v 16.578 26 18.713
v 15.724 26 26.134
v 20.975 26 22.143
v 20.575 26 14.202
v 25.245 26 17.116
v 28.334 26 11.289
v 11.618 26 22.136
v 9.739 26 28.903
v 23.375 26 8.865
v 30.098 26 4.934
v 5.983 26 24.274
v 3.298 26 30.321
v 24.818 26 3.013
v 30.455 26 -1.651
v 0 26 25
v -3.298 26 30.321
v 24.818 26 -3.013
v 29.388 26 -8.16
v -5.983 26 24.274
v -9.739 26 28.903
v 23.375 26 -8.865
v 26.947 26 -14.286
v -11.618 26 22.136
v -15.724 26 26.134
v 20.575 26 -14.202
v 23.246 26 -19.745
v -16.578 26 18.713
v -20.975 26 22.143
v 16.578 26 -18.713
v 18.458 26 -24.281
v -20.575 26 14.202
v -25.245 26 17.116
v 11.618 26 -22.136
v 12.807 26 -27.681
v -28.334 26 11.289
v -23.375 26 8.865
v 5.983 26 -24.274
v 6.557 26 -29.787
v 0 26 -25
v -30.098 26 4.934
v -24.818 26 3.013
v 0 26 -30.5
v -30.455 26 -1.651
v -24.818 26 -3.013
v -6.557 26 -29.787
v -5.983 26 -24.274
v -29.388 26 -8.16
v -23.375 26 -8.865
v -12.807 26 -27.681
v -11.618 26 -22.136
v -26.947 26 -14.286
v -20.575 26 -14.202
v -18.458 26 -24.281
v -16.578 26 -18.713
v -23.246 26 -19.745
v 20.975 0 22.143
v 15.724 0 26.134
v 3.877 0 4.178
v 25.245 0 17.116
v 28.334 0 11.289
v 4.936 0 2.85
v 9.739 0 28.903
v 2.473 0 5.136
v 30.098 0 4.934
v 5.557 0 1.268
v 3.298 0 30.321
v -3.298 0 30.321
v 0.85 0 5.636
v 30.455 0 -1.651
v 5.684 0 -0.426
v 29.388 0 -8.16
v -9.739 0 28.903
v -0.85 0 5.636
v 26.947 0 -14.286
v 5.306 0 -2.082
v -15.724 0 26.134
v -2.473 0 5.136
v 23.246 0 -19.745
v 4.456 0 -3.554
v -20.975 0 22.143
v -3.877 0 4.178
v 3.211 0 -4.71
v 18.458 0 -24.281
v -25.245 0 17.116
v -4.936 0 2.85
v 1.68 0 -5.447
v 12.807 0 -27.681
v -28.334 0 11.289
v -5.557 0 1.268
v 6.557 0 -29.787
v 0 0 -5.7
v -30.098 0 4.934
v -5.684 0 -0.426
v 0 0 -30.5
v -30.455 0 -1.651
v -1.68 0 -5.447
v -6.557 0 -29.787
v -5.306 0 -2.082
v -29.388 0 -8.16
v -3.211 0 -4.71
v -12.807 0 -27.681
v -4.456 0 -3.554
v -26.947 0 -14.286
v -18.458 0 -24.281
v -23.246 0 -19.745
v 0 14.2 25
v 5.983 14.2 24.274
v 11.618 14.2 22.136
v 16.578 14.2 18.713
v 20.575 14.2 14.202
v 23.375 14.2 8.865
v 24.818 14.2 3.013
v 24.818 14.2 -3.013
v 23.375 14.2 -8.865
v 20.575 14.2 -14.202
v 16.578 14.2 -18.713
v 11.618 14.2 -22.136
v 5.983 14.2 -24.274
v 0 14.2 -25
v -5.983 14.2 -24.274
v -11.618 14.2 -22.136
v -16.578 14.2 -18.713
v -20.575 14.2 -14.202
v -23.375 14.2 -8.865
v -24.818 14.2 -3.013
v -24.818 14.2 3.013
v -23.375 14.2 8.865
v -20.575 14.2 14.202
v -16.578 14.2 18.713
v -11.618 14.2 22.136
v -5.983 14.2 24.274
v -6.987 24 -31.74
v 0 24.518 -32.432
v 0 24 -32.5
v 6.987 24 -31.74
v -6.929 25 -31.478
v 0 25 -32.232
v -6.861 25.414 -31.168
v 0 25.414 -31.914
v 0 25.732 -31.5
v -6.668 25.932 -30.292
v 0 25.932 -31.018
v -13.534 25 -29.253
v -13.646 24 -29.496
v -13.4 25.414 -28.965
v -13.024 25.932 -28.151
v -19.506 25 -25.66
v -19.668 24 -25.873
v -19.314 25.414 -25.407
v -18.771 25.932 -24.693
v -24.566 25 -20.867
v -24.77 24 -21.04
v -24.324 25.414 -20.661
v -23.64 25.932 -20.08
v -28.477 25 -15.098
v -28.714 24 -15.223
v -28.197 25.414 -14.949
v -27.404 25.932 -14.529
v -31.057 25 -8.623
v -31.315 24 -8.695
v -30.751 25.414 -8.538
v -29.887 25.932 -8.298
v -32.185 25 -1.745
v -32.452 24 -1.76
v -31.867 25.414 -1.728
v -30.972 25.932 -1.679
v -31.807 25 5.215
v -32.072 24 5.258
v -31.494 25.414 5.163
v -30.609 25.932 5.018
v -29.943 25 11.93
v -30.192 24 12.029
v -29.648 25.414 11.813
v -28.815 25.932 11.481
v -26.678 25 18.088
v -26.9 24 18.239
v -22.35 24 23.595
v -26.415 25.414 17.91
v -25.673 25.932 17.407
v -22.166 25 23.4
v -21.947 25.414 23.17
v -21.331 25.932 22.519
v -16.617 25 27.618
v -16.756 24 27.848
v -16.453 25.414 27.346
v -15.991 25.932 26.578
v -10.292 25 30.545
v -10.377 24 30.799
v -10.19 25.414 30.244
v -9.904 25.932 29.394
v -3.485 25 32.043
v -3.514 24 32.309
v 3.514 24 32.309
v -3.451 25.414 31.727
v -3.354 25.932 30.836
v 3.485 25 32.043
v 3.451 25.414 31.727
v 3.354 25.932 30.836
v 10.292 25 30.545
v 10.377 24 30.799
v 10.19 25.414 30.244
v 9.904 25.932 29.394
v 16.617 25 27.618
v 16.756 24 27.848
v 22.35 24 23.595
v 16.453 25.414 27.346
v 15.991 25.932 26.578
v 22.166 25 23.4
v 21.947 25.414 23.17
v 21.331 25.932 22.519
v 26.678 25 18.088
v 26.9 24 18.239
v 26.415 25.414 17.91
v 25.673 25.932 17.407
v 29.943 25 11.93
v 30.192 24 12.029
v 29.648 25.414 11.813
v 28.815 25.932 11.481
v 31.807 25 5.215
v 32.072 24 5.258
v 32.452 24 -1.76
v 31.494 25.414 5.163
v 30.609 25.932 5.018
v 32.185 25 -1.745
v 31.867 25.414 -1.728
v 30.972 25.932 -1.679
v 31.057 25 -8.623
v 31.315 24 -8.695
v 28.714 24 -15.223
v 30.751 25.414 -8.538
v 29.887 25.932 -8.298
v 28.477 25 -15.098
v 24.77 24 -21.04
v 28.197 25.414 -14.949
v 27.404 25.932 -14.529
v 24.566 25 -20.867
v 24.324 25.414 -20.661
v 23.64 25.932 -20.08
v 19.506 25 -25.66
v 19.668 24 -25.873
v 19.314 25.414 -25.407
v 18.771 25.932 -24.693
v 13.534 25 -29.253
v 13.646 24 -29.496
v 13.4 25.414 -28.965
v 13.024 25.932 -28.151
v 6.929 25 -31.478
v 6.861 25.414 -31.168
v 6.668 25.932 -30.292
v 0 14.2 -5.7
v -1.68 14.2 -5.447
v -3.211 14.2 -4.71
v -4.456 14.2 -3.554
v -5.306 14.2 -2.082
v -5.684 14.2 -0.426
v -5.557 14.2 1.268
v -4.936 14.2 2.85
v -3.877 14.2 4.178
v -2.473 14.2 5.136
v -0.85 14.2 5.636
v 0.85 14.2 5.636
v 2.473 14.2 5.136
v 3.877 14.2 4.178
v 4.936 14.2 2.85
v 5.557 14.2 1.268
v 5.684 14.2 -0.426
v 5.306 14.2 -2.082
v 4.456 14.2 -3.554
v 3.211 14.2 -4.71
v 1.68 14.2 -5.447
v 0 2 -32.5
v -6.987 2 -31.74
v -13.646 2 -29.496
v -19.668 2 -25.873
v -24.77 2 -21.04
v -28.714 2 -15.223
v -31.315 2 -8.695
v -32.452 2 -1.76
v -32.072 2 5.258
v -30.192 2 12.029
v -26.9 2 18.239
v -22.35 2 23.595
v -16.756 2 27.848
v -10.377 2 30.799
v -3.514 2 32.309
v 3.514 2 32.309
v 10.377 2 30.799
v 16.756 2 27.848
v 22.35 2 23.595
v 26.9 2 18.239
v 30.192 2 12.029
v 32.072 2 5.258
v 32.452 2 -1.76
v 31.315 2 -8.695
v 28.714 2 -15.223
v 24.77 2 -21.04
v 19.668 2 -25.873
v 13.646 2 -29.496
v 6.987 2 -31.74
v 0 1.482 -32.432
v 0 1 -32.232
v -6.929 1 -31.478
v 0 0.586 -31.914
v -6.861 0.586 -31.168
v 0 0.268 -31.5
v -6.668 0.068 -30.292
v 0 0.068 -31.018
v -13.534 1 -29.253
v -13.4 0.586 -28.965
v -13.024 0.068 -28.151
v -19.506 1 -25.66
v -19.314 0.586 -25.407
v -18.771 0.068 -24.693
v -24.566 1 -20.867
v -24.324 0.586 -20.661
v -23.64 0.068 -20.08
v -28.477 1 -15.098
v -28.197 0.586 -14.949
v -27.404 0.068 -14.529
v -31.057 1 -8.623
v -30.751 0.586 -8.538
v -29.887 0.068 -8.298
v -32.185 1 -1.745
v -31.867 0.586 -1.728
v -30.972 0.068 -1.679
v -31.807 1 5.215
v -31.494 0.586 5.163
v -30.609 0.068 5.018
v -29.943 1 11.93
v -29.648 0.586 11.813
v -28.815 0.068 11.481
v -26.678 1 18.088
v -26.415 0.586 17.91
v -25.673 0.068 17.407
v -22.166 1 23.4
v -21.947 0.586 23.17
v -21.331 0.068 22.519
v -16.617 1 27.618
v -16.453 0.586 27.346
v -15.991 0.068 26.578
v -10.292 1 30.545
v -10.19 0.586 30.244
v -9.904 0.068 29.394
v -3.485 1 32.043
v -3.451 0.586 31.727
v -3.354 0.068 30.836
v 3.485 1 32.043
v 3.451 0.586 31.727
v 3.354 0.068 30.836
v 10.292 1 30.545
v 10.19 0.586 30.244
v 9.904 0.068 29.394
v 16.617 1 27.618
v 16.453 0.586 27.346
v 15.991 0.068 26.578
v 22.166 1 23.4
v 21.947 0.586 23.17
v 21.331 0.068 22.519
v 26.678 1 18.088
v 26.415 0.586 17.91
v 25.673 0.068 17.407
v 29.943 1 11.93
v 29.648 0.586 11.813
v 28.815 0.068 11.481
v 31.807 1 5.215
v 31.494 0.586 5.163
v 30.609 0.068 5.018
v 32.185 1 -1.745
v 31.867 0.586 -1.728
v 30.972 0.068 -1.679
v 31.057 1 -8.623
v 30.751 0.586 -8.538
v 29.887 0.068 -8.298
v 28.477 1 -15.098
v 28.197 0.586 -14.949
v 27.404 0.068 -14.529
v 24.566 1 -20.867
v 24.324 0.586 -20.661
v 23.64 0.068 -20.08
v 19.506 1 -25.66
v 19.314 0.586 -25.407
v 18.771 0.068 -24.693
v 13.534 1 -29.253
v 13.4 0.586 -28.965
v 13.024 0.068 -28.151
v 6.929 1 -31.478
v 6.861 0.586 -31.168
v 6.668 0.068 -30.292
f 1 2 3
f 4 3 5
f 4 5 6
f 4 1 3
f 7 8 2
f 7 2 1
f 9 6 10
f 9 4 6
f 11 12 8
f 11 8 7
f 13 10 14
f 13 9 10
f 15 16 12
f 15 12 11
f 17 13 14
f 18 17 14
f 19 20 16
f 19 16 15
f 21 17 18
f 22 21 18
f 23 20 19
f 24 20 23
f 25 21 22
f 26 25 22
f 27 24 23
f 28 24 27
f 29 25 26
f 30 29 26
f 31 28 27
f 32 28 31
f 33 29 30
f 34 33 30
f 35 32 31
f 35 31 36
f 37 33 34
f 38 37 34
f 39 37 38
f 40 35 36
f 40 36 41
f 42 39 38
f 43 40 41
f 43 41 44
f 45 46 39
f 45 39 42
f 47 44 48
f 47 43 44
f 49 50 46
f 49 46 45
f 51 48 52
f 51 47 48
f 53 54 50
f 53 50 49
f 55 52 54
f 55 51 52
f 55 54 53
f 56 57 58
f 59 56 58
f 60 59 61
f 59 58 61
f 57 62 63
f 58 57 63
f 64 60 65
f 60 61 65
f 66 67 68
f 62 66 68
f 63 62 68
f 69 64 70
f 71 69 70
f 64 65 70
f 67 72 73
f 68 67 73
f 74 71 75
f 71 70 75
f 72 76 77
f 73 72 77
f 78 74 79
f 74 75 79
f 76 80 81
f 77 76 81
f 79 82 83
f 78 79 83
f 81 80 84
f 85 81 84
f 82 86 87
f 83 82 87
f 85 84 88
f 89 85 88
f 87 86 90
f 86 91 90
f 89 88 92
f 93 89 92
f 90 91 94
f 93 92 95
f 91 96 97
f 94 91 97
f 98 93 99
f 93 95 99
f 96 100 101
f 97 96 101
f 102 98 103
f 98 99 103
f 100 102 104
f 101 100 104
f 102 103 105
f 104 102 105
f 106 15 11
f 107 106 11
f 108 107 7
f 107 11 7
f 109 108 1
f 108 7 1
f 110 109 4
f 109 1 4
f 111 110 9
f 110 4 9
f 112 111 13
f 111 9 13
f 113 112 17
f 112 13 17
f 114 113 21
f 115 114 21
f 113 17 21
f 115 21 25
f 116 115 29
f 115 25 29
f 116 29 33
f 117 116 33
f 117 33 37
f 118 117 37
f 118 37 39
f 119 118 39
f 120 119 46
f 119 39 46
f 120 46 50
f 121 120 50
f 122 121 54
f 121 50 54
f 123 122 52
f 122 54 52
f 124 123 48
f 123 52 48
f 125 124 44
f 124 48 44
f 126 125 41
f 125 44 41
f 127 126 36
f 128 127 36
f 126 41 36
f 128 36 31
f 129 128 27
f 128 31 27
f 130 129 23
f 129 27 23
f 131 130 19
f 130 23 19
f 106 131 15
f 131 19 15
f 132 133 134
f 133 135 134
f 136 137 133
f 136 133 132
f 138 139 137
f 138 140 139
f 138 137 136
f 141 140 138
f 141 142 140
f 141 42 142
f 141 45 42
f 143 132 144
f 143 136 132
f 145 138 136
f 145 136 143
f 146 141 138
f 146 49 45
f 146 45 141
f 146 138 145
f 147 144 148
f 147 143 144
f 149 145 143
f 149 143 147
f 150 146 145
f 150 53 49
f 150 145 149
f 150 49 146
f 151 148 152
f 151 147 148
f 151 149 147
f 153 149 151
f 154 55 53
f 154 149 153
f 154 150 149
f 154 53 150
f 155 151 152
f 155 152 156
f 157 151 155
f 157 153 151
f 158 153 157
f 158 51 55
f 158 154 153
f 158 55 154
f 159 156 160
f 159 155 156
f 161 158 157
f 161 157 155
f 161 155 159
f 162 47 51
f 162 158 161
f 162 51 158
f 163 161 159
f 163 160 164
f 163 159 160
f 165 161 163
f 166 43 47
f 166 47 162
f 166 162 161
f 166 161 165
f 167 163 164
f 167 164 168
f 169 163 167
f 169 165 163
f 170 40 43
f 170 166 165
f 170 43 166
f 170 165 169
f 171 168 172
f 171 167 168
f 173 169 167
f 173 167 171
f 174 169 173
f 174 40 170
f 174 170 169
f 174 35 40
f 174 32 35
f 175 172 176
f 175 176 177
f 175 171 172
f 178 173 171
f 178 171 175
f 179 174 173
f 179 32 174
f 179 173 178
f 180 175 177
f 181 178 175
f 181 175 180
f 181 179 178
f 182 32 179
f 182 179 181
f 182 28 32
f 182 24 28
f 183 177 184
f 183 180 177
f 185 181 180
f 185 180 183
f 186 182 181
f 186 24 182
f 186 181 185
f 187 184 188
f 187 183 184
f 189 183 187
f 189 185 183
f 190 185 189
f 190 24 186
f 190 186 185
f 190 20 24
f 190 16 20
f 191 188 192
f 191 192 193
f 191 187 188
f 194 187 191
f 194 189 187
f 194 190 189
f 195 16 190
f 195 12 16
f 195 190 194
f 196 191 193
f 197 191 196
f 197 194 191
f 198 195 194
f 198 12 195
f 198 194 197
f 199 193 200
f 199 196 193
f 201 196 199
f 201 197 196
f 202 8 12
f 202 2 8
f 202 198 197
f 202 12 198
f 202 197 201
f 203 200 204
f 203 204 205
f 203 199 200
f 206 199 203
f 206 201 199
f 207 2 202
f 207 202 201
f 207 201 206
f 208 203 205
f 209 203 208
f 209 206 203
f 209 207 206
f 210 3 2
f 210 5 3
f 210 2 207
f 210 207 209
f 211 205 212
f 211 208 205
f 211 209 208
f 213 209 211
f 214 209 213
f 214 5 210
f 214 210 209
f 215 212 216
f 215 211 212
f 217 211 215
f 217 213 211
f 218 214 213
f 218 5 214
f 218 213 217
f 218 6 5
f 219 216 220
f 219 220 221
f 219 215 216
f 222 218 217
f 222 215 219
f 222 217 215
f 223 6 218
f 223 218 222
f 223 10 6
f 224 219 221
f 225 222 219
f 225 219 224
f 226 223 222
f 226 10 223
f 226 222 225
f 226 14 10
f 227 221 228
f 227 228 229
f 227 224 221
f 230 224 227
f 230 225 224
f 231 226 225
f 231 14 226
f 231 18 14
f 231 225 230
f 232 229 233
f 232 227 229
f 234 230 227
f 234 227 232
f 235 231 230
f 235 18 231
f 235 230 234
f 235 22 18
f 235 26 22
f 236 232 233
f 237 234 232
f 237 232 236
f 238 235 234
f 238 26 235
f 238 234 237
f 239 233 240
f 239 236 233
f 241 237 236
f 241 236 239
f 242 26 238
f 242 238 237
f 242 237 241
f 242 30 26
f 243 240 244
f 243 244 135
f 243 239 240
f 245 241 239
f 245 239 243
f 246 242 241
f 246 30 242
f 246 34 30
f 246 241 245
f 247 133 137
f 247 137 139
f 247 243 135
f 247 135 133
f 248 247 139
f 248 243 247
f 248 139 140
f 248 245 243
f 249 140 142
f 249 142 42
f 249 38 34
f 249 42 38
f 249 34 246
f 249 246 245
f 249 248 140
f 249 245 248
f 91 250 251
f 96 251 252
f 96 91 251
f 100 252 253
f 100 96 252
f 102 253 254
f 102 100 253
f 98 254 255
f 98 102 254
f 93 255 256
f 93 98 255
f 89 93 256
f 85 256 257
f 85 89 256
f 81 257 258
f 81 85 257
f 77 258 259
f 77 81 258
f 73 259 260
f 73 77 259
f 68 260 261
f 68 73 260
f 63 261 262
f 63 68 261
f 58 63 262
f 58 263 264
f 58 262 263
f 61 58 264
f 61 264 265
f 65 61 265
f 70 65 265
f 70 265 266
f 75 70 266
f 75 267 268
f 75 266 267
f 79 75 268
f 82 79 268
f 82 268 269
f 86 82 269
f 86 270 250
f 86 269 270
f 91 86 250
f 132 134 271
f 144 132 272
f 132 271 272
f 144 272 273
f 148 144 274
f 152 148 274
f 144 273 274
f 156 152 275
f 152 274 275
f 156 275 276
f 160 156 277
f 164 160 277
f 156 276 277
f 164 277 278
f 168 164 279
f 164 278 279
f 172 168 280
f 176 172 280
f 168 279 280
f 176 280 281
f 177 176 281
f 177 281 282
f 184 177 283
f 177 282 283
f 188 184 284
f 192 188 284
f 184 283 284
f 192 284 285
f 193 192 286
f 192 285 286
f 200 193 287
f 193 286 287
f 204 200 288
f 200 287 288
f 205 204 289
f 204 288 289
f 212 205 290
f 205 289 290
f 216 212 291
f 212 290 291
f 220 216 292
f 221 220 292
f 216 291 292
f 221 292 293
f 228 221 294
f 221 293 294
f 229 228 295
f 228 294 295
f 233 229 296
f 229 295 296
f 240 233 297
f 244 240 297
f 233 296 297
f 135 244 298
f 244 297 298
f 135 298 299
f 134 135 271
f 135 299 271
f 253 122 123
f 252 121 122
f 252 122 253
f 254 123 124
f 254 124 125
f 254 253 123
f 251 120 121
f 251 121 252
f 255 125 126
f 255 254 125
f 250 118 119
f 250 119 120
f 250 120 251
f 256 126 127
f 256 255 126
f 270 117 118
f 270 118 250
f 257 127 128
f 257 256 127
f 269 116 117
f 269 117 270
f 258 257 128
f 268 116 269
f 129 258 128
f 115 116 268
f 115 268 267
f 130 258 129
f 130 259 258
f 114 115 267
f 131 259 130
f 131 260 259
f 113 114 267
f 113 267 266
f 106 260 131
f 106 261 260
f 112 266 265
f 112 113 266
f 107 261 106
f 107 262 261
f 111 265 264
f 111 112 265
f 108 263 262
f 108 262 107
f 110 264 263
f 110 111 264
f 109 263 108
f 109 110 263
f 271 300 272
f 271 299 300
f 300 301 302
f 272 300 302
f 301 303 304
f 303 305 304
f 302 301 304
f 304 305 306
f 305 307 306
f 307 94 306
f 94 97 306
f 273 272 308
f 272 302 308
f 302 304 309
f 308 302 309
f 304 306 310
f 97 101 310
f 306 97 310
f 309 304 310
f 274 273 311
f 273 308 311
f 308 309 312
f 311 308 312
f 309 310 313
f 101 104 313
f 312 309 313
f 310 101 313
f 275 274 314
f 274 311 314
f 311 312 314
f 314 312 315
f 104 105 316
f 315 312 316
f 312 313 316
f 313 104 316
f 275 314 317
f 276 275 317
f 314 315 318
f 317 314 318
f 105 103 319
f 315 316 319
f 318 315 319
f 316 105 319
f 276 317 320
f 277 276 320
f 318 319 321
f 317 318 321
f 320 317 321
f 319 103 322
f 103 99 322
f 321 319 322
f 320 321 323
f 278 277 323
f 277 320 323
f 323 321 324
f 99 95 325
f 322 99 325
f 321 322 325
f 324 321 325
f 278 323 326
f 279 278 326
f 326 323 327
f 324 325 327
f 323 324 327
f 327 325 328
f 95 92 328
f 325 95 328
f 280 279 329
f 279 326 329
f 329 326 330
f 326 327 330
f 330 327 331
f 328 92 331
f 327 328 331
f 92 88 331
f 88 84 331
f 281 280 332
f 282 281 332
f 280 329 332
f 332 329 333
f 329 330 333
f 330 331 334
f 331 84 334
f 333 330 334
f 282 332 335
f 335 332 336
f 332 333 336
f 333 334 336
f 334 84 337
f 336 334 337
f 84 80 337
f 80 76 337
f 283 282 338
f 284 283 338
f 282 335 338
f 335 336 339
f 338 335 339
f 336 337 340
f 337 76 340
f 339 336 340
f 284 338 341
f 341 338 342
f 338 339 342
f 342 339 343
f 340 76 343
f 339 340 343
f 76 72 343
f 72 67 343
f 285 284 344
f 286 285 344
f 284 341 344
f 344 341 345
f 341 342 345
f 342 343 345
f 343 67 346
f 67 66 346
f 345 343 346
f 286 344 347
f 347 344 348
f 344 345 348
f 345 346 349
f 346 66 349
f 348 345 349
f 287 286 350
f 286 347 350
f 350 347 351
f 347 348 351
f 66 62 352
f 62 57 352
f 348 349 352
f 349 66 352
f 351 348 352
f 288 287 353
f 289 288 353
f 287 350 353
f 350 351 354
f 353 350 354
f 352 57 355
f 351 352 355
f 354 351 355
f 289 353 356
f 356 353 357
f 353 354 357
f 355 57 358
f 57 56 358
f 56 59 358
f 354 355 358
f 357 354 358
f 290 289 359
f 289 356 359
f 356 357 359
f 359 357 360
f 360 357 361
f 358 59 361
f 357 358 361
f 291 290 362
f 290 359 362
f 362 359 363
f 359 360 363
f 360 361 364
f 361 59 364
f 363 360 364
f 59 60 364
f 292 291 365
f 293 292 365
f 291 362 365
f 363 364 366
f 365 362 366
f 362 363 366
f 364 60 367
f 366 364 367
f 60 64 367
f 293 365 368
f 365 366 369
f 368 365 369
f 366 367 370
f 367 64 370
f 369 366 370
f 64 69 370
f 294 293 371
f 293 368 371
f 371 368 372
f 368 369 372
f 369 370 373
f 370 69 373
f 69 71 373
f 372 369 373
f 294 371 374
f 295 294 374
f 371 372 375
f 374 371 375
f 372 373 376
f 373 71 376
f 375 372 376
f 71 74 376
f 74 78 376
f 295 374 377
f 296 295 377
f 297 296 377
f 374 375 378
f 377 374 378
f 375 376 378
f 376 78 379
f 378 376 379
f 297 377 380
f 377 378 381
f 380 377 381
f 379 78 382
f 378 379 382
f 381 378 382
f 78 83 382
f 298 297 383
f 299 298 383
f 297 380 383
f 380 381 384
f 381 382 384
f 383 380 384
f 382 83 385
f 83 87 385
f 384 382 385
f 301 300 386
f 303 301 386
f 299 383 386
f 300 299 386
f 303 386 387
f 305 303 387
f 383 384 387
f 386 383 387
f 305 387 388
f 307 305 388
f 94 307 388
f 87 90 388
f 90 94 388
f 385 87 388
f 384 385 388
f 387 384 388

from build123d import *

# Parameters (mm, degrees)
SKETCH_1_R          = 32.5
SKETCH_1_R_2        = 5.7
EXTRUDE_1_DEPTH     = 26
SKETCH_2_R          = 25
CUT_EXTRUDE_1_DEPTH = 11.8
FILLET_1_R          = 2


with BuildPart() as part:
    # 草图1 → 凸台-拉伸1 (new body)
    with BuildSketch(Plane(origin=(0, 0, 0), x_dir=(1, 0, 0), z_dir=(0, 1, 0))):
        with Locations(Location((0, 0, 0), (0, 0, 90))):
            Circle(SKETCH_1_R)
        with Locations(Location((0, 0, 0), (0, 0, 90))):
            Circle(SKETCH_1_R_2, mode=Mode.SUBTRACT)
    extrude(amount=EXTRUDE_1_DEPTH)

    # 草图2 → 切除-拉伸1 (cut)
    with BuildSketch(Plane(origin=(0, 26, 0), x_dir=(1, 0, 0), z_dir=(0, 1, 0))):
        with Locations(Location((0, 0, 0), (0, 0, 270))):
            Circle(SKETCH_2_R)
    extrude(amount=-CUT_EXTRUDE_1_DEPTH, mode=Mode.SUBTRACT)

    # 圆角1
    fillet_1_edges = [part.edges().sort_by_distance(p)[0] for p in [
        (0, 0, 32.5),
        (0, 26, 32.5),
    ]]
    fillet(fillet_1_edges, radius=FILLET_1_R)


solid = part.part
